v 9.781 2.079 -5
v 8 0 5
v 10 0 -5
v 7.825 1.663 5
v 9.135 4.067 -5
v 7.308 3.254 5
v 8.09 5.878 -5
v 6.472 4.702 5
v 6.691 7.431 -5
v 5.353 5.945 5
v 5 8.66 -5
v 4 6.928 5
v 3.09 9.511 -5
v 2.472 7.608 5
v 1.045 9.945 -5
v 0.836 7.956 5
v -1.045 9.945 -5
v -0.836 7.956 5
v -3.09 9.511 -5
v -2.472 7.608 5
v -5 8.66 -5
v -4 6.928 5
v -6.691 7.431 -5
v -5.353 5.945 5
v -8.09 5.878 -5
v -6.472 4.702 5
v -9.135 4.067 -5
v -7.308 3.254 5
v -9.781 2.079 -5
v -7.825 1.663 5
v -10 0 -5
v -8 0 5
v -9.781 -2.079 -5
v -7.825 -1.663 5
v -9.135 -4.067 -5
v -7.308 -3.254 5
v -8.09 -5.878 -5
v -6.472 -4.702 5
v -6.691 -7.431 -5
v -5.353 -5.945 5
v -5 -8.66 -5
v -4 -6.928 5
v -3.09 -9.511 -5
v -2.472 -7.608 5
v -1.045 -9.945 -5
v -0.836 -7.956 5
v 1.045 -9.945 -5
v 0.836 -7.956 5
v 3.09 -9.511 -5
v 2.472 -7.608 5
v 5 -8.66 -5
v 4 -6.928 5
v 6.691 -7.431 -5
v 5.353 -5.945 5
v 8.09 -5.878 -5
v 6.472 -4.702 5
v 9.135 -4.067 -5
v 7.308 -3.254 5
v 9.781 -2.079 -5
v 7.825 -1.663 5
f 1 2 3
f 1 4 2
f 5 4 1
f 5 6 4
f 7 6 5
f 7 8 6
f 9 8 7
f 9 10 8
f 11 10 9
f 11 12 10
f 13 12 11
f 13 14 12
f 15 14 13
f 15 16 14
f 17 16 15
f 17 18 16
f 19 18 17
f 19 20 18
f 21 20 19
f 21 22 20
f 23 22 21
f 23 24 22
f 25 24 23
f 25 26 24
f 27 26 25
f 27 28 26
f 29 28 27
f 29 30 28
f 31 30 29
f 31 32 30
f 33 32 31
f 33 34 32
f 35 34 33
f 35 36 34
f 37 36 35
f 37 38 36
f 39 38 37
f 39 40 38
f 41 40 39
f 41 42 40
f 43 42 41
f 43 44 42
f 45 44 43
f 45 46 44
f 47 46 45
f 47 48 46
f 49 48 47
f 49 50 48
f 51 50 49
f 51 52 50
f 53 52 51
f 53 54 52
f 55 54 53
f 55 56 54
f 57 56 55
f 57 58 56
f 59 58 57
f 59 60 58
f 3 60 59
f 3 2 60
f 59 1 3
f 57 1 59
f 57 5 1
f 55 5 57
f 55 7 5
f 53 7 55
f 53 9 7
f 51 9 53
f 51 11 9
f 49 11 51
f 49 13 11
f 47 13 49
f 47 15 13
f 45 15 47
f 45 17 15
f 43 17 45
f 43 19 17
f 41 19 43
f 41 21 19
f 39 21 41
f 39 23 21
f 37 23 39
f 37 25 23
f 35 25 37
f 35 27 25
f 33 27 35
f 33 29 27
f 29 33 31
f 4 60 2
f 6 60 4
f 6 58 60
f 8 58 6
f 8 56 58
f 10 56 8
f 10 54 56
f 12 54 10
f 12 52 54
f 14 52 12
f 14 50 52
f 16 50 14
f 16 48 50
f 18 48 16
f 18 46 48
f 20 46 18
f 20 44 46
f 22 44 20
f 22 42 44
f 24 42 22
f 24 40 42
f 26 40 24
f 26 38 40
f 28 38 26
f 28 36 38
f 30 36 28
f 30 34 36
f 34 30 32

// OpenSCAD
// intersection() {
//     cylinder(r=25, h=10);
//translate([0,0,1]) 
// resize([50,50,6]) {
//     surface(file = "alpes.png", center = true, invert=false, convexity = 5);
// }
// }


// difference() {
//     translate([0,0,-2]) cylinder(r=26, h=3);
//     cylinder(r=25, h=4);
// }


translate([0, 0, 0]) {
    cylinder(r1 = 10, r2 = 8, h = 10, center = true);
}
